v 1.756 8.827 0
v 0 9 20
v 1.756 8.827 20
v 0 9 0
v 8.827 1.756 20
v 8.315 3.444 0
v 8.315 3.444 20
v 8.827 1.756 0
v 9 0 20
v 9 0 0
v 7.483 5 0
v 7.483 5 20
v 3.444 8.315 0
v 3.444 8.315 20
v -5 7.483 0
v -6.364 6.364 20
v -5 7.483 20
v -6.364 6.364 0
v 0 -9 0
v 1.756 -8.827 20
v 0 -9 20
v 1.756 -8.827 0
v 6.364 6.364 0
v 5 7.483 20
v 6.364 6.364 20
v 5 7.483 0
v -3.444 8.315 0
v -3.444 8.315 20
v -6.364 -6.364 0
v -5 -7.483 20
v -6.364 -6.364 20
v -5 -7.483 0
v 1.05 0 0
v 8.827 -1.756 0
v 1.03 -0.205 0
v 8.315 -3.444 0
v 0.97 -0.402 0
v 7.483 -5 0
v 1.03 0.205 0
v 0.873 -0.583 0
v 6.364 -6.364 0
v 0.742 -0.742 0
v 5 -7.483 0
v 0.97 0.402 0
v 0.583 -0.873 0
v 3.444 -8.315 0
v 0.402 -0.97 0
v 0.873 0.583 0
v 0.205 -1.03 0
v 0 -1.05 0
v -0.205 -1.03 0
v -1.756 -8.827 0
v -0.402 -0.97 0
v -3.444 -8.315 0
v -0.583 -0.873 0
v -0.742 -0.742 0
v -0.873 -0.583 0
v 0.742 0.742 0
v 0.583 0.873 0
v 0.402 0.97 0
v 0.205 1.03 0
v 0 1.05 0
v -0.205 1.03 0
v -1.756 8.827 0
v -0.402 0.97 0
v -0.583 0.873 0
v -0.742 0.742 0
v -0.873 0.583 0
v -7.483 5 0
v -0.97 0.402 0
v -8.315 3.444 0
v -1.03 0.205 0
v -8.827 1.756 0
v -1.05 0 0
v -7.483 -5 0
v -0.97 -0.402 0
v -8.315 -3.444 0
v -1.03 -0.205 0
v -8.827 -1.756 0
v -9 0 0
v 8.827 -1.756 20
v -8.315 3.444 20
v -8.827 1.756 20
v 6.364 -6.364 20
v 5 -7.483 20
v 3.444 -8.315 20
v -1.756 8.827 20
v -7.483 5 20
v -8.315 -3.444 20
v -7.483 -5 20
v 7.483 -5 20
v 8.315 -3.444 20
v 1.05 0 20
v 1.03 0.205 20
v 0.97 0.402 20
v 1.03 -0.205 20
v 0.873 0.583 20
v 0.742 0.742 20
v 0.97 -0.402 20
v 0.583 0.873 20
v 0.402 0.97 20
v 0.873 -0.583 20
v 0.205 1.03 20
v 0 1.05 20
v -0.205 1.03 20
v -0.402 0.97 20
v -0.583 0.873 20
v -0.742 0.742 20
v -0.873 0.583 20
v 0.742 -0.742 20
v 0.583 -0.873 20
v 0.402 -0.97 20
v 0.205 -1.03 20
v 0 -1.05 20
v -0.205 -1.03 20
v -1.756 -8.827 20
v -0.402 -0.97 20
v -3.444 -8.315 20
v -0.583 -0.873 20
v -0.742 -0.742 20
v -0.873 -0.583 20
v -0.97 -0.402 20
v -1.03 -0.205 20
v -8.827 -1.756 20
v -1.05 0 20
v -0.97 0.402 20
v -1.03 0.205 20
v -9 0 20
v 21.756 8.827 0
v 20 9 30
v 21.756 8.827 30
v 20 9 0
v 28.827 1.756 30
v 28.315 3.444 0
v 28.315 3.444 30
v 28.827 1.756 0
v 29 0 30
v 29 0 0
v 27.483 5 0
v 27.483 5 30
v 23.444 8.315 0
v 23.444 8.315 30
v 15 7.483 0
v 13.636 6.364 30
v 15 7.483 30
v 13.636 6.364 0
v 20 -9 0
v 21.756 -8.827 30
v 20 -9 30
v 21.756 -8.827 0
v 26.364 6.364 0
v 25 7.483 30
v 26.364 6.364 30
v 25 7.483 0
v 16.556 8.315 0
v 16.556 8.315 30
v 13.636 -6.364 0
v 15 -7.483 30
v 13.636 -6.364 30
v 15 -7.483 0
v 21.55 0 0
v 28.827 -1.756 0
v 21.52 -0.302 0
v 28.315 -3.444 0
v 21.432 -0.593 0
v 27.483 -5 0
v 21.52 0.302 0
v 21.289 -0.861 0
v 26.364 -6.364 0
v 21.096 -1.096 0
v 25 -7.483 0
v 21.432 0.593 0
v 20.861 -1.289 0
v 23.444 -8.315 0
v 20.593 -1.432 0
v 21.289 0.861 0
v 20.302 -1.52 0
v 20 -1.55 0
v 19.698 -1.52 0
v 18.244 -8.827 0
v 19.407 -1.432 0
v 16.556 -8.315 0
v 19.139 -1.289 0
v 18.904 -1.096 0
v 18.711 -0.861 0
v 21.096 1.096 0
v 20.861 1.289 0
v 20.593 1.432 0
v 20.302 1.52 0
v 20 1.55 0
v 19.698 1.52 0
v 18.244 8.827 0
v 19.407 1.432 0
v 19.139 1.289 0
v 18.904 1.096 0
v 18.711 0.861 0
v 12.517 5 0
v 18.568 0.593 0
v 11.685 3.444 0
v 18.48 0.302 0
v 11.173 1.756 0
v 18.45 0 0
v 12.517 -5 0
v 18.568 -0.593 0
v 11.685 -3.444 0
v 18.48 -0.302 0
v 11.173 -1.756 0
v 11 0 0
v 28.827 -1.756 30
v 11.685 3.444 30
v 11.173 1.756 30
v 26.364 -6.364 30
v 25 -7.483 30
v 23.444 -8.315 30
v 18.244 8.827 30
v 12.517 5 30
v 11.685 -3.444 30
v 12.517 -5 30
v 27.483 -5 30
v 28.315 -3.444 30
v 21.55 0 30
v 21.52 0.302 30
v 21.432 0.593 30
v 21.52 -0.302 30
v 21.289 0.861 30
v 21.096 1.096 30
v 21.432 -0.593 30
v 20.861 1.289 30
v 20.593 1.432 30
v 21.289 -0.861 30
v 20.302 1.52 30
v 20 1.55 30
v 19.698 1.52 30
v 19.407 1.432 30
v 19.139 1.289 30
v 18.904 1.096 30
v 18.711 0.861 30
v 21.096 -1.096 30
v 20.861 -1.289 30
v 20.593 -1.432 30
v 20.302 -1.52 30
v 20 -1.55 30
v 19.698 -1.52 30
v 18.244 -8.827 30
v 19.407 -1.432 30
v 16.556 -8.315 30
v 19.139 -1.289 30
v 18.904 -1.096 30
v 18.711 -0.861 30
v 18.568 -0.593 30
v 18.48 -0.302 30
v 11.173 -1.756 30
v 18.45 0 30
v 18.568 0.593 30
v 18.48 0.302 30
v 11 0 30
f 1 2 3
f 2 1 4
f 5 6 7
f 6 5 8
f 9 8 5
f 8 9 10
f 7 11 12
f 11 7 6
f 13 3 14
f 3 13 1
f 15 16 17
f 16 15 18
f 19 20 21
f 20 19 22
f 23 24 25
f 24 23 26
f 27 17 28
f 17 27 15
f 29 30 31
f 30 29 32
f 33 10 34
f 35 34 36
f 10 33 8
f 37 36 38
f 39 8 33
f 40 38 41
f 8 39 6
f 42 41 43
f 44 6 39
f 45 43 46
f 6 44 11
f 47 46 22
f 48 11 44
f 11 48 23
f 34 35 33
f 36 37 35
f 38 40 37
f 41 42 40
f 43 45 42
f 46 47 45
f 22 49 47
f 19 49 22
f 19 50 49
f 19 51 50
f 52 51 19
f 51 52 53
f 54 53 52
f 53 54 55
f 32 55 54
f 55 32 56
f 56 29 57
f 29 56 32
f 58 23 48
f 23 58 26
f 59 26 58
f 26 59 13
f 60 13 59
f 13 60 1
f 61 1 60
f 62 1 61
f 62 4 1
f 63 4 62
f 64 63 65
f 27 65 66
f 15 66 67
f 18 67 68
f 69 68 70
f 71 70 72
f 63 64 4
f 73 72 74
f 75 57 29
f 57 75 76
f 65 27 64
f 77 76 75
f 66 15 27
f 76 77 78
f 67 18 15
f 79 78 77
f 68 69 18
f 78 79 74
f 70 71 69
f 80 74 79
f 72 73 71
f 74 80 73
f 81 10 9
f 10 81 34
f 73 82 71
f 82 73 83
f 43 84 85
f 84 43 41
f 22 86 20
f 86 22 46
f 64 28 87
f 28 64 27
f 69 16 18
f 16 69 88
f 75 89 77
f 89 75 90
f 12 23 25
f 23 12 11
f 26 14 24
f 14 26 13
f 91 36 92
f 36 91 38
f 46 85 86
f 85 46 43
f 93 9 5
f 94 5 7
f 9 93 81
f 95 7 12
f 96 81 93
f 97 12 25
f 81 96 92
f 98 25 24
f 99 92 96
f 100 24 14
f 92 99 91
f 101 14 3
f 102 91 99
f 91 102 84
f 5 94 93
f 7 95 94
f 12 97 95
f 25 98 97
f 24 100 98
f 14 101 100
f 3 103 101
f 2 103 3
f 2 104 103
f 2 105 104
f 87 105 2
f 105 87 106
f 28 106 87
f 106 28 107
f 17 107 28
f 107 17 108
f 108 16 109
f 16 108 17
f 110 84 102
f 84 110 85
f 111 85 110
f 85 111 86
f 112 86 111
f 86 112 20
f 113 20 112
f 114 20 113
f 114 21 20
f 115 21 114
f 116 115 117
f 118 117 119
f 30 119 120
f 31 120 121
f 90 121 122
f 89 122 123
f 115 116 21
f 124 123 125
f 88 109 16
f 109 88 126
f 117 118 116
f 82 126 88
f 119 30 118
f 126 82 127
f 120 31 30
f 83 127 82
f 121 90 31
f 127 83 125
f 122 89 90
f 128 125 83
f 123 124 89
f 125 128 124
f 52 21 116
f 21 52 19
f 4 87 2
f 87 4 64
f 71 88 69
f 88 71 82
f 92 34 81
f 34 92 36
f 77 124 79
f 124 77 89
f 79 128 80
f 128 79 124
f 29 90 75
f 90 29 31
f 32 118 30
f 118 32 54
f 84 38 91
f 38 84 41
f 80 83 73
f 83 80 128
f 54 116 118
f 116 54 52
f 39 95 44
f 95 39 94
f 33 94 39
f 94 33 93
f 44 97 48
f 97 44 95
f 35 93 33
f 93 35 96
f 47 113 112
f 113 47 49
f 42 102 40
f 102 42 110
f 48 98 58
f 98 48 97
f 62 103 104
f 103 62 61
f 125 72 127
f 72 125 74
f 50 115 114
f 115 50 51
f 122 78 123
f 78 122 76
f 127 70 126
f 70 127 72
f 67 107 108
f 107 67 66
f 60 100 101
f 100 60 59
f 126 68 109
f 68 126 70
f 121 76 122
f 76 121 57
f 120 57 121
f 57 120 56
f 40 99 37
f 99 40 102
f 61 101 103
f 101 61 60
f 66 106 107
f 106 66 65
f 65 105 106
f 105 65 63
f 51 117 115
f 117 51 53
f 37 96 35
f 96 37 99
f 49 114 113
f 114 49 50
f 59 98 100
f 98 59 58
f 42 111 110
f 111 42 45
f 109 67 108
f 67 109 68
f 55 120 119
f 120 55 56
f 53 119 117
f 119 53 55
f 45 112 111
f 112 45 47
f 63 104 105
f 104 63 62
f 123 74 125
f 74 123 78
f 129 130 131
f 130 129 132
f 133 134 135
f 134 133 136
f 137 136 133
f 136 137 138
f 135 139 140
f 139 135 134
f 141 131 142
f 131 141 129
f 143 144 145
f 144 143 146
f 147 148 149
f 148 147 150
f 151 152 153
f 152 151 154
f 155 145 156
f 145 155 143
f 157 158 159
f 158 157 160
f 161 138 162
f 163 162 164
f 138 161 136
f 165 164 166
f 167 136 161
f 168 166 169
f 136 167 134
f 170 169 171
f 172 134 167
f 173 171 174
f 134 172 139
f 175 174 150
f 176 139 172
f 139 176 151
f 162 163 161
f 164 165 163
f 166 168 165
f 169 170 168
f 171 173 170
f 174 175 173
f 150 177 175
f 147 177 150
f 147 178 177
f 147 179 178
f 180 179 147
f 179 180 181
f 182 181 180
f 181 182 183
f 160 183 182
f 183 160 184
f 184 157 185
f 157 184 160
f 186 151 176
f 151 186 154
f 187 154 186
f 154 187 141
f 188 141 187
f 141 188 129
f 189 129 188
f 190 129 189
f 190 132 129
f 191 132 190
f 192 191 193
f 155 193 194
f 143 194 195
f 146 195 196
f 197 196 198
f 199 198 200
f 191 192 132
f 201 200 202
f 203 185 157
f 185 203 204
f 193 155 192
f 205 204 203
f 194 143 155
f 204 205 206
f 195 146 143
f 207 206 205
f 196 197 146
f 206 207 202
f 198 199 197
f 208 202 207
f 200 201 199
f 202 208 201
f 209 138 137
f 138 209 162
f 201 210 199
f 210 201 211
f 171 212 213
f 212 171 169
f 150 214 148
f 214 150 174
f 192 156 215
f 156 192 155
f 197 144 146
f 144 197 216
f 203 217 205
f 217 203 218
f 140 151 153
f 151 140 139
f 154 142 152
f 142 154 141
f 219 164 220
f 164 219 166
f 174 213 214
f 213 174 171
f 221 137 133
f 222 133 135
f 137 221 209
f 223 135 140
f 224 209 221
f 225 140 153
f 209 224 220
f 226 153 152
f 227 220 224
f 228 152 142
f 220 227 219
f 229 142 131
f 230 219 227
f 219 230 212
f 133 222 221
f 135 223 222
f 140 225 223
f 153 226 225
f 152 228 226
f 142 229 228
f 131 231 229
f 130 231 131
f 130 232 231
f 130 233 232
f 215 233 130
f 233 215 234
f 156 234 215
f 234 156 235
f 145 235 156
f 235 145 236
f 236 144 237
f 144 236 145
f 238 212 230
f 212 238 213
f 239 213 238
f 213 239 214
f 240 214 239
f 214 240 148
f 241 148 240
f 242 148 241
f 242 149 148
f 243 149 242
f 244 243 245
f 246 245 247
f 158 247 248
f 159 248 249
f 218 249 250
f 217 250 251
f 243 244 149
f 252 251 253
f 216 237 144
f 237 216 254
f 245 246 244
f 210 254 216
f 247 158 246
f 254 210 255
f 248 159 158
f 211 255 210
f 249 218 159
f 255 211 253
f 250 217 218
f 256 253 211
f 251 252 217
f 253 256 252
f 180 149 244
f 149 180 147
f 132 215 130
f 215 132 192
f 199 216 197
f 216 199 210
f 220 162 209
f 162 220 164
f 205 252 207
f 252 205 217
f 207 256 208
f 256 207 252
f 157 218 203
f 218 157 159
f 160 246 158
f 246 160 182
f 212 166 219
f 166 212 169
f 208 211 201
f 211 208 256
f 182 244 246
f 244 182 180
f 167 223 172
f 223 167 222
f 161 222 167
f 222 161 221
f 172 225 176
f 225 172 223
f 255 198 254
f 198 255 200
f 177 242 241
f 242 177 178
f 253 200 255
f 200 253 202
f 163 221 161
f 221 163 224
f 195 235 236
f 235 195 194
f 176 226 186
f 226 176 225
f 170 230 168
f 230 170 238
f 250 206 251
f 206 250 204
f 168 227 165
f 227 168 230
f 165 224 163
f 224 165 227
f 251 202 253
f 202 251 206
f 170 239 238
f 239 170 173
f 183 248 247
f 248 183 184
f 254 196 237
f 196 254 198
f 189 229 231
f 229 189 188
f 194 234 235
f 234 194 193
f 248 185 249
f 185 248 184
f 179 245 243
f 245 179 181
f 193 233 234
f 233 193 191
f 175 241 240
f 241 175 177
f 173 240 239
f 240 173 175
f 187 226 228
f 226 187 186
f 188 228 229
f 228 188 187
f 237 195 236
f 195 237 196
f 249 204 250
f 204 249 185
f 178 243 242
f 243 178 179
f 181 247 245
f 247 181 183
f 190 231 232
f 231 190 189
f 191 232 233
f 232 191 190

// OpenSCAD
$fn=32;

module bigyo(D,D2,L) {
    translate([0,0,L/2])
    difference() {
        cylinder(d=D, h=L,center=true);
        cylinder(d=D2, h=L*2,center=true);
    }
}


bigyo(18,   2.1 ,   20);
translate([20,0,0])
bigyo(18,   3.1 ,   30);
